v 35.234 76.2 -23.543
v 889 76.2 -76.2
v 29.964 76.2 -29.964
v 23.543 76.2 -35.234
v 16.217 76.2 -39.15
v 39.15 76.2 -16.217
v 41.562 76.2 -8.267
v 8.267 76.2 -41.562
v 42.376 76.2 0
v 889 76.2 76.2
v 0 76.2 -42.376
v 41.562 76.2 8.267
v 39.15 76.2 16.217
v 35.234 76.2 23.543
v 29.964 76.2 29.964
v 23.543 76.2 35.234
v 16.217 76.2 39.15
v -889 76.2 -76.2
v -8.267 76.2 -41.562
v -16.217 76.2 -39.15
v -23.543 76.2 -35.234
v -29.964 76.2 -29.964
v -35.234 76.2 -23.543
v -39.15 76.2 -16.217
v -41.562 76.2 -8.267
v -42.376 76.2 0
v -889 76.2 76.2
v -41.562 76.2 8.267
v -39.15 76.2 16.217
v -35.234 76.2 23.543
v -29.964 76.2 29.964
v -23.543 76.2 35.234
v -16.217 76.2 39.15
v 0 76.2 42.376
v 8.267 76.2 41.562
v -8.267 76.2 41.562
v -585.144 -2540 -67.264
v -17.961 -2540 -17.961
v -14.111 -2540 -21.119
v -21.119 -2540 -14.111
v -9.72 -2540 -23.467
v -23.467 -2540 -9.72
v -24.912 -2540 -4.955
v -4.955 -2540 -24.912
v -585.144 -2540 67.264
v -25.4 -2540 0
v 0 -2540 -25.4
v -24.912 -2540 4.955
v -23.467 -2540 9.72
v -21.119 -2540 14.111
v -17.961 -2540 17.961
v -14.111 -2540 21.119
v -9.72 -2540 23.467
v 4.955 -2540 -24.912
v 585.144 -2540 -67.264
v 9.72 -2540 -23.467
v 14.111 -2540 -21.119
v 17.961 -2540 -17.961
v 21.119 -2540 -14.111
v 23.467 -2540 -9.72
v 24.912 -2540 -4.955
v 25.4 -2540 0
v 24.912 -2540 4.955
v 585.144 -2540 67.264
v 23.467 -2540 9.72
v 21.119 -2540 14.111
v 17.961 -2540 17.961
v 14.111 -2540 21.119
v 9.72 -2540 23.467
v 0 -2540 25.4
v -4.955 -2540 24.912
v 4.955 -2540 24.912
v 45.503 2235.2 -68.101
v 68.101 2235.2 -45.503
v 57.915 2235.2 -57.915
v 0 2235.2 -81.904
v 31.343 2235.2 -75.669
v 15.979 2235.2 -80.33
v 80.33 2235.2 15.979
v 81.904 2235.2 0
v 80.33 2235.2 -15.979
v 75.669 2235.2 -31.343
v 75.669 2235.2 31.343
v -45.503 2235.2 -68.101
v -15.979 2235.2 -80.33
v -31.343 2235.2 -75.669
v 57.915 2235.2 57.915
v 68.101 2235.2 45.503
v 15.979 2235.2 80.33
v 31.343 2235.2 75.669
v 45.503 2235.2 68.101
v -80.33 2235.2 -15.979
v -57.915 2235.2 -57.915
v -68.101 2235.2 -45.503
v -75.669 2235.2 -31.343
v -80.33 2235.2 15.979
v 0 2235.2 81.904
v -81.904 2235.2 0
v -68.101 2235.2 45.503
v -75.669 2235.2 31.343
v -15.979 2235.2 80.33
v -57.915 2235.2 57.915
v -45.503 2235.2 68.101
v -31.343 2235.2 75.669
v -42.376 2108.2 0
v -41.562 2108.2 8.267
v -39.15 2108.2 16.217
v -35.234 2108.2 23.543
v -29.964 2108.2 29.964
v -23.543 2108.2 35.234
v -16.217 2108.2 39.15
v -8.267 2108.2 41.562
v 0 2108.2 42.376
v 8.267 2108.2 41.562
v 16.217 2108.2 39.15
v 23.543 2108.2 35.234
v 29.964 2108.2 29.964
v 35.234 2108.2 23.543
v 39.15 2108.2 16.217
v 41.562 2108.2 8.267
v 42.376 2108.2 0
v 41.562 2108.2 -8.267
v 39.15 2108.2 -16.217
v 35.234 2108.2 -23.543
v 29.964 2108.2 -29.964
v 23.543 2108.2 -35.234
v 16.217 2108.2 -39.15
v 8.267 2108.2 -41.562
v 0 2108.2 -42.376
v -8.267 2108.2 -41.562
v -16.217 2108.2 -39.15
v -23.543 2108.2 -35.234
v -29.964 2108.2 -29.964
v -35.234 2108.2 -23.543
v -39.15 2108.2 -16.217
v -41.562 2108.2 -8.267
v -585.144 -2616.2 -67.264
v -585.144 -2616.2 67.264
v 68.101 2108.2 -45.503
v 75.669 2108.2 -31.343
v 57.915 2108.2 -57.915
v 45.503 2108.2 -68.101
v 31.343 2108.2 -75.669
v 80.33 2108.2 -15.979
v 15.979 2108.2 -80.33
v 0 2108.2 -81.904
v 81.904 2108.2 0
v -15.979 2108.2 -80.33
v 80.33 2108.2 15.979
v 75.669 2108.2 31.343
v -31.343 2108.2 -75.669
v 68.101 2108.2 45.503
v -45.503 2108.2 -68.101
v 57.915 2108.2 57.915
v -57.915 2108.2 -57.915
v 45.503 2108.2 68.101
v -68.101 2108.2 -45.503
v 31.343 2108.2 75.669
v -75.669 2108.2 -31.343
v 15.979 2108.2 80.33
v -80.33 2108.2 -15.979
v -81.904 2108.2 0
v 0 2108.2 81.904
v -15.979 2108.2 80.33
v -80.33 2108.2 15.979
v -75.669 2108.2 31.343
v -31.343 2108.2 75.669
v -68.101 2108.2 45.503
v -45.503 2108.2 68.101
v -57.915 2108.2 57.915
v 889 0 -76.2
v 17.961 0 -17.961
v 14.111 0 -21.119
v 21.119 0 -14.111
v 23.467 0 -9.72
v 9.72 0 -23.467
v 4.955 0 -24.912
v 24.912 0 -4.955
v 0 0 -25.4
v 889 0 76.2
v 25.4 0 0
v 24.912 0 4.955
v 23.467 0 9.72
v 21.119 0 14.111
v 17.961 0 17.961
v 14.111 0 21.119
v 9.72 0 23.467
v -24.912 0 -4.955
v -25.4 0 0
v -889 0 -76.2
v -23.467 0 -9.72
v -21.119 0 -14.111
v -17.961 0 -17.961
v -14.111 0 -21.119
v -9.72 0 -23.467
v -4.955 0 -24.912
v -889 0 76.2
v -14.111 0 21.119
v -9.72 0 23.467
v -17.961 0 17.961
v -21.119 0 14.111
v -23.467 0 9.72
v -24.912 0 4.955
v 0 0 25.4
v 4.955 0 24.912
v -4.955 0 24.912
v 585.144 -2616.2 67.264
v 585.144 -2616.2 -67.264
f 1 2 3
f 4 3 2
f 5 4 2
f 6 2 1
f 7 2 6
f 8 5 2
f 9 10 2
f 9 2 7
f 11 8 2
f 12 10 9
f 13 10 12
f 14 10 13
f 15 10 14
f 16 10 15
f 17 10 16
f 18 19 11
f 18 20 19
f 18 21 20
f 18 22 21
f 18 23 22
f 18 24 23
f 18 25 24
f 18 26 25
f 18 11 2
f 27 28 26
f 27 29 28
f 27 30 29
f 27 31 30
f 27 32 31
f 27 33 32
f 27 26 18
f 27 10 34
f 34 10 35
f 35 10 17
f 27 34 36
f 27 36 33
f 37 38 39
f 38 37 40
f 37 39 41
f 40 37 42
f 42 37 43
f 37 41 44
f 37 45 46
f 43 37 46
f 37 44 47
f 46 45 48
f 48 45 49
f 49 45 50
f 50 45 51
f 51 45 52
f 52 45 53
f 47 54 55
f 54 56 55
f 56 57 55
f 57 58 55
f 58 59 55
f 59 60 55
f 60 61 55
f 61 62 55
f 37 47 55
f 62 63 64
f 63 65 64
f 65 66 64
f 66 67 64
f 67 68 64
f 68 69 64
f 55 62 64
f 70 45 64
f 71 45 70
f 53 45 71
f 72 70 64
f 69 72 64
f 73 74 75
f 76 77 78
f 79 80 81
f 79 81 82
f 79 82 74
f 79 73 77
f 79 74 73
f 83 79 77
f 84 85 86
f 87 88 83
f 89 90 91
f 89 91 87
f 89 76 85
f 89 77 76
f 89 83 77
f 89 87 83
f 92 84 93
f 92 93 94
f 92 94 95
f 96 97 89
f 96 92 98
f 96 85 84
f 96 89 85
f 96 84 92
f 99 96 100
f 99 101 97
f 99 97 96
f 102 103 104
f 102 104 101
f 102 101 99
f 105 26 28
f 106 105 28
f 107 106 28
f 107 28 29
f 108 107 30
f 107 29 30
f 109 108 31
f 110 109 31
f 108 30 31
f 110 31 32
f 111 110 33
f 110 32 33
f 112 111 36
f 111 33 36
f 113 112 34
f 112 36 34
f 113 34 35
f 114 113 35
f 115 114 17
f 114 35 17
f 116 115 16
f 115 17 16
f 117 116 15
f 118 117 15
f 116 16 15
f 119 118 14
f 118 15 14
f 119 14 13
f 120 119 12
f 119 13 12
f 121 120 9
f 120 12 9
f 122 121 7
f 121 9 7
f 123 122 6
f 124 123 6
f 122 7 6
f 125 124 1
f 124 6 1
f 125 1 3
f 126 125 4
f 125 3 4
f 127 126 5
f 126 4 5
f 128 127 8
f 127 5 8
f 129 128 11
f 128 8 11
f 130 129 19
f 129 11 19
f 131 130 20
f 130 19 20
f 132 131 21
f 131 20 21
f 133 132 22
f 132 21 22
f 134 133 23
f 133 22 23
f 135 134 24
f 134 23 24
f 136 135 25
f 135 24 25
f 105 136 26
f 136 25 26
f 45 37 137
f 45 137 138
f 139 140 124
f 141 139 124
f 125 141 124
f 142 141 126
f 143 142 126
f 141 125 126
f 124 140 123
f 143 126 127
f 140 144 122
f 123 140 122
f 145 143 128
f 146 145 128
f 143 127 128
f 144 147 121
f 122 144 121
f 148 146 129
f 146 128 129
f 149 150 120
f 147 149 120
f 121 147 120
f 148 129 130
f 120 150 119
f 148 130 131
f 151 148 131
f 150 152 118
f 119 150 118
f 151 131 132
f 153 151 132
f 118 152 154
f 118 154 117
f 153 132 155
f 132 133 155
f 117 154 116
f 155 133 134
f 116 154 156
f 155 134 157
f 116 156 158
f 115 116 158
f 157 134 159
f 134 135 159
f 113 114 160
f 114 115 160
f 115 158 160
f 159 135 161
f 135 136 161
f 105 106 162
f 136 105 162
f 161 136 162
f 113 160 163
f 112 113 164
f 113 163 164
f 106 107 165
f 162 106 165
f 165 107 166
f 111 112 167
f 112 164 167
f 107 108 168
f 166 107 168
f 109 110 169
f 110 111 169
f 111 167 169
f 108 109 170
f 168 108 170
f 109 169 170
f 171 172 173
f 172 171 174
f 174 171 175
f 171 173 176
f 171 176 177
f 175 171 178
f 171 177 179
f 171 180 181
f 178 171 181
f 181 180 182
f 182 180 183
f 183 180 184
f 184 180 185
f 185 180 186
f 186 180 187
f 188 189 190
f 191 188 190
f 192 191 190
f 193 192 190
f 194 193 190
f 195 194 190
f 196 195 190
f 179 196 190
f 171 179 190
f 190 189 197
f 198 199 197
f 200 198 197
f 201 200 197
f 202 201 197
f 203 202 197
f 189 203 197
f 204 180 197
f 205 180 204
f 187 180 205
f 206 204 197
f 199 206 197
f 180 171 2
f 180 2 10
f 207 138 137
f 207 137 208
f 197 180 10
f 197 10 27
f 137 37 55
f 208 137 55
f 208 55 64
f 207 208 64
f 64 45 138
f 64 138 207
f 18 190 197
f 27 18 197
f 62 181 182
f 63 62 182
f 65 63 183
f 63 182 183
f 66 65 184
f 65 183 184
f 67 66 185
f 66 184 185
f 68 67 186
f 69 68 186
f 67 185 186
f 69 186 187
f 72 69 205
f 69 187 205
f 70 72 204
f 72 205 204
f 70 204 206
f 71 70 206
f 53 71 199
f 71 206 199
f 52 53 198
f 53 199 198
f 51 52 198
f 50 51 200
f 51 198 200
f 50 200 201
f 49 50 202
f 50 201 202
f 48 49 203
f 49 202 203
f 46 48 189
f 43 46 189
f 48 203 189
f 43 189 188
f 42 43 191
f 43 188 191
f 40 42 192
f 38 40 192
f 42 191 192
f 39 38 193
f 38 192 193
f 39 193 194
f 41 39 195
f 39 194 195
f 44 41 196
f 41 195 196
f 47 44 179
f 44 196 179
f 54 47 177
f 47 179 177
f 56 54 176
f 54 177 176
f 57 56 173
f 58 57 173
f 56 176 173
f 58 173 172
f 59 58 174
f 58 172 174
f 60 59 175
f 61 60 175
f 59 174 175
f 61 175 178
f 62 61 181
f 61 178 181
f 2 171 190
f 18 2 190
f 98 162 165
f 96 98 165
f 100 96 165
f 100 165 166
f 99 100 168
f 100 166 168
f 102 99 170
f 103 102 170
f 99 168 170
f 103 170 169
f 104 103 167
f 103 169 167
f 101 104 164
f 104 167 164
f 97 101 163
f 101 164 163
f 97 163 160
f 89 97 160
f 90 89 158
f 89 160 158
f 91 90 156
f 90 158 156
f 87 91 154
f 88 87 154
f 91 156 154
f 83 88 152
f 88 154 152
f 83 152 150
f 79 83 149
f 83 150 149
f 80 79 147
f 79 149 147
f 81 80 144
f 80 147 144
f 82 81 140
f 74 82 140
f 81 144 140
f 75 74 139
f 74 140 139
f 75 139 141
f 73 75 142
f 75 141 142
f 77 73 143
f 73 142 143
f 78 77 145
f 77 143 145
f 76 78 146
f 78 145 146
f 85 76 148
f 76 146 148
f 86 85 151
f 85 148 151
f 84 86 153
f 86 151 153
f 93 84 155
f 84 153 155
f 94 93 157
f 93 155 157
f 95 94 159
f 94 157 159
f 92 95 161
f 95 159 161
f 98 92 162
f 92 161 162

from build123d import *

# Parameters (mm, degrees)
F0_R     = 25.4
F1_DEPTH = 2540
F2_W     = 1170.288802
F2_H     = 134.52828
F3_DEPTH = 76.2
F4_W     = 1778
F4_H     = 152.4
F5_DEPTH = 76.2
F6_R     = 42.375834
F7_DEPTH = 2032
F8_R     = 81.903874
F9_DEPTH = 127


with BuildPart() as f1:
    # F0 (on Front) → F1 (new body)
    with BuildSketch(Plane.XZ):
        Circle(F0_R)
    extrude(amount=F1_DEPTH)

    # F2 (on face) → F3 (join)
    with BuildSketch(Plane.XZ.offset(2540)):
        Rectangle(F2_W, F2_H)
    extrude(amount=F3_DEPTH)

    # F4 (on face) → F5 (join)
    with BuildSketch(Plane(origin=(0, 0, 0), x_dir=(-1, 0, 0), z_dir=(0, 1, 0))):
        Rectangle(F4_W, F4_H)
    extrude(amount=F5_DEPTH)

    # F6 (on face) → F7 (join)
    with BuildSketch(Plane(origin=(0, 76.2, 0), x_dir=(-1, 0, 0), z_dir=(0, 1, 0))):
        Circle(F6_R)
    extrude(amount=F7_DEPTH)

    # F8 (on face) → F9 (join)
    with BuildSketch(Plane(origin=(0, 2108.2, 0), x_dir=(-1, 0, 0), z_dir=(0, 1, 0))):
        Circle(F8_R)
    extrude(amount=F9_DEPTH)


solid = f1.part
